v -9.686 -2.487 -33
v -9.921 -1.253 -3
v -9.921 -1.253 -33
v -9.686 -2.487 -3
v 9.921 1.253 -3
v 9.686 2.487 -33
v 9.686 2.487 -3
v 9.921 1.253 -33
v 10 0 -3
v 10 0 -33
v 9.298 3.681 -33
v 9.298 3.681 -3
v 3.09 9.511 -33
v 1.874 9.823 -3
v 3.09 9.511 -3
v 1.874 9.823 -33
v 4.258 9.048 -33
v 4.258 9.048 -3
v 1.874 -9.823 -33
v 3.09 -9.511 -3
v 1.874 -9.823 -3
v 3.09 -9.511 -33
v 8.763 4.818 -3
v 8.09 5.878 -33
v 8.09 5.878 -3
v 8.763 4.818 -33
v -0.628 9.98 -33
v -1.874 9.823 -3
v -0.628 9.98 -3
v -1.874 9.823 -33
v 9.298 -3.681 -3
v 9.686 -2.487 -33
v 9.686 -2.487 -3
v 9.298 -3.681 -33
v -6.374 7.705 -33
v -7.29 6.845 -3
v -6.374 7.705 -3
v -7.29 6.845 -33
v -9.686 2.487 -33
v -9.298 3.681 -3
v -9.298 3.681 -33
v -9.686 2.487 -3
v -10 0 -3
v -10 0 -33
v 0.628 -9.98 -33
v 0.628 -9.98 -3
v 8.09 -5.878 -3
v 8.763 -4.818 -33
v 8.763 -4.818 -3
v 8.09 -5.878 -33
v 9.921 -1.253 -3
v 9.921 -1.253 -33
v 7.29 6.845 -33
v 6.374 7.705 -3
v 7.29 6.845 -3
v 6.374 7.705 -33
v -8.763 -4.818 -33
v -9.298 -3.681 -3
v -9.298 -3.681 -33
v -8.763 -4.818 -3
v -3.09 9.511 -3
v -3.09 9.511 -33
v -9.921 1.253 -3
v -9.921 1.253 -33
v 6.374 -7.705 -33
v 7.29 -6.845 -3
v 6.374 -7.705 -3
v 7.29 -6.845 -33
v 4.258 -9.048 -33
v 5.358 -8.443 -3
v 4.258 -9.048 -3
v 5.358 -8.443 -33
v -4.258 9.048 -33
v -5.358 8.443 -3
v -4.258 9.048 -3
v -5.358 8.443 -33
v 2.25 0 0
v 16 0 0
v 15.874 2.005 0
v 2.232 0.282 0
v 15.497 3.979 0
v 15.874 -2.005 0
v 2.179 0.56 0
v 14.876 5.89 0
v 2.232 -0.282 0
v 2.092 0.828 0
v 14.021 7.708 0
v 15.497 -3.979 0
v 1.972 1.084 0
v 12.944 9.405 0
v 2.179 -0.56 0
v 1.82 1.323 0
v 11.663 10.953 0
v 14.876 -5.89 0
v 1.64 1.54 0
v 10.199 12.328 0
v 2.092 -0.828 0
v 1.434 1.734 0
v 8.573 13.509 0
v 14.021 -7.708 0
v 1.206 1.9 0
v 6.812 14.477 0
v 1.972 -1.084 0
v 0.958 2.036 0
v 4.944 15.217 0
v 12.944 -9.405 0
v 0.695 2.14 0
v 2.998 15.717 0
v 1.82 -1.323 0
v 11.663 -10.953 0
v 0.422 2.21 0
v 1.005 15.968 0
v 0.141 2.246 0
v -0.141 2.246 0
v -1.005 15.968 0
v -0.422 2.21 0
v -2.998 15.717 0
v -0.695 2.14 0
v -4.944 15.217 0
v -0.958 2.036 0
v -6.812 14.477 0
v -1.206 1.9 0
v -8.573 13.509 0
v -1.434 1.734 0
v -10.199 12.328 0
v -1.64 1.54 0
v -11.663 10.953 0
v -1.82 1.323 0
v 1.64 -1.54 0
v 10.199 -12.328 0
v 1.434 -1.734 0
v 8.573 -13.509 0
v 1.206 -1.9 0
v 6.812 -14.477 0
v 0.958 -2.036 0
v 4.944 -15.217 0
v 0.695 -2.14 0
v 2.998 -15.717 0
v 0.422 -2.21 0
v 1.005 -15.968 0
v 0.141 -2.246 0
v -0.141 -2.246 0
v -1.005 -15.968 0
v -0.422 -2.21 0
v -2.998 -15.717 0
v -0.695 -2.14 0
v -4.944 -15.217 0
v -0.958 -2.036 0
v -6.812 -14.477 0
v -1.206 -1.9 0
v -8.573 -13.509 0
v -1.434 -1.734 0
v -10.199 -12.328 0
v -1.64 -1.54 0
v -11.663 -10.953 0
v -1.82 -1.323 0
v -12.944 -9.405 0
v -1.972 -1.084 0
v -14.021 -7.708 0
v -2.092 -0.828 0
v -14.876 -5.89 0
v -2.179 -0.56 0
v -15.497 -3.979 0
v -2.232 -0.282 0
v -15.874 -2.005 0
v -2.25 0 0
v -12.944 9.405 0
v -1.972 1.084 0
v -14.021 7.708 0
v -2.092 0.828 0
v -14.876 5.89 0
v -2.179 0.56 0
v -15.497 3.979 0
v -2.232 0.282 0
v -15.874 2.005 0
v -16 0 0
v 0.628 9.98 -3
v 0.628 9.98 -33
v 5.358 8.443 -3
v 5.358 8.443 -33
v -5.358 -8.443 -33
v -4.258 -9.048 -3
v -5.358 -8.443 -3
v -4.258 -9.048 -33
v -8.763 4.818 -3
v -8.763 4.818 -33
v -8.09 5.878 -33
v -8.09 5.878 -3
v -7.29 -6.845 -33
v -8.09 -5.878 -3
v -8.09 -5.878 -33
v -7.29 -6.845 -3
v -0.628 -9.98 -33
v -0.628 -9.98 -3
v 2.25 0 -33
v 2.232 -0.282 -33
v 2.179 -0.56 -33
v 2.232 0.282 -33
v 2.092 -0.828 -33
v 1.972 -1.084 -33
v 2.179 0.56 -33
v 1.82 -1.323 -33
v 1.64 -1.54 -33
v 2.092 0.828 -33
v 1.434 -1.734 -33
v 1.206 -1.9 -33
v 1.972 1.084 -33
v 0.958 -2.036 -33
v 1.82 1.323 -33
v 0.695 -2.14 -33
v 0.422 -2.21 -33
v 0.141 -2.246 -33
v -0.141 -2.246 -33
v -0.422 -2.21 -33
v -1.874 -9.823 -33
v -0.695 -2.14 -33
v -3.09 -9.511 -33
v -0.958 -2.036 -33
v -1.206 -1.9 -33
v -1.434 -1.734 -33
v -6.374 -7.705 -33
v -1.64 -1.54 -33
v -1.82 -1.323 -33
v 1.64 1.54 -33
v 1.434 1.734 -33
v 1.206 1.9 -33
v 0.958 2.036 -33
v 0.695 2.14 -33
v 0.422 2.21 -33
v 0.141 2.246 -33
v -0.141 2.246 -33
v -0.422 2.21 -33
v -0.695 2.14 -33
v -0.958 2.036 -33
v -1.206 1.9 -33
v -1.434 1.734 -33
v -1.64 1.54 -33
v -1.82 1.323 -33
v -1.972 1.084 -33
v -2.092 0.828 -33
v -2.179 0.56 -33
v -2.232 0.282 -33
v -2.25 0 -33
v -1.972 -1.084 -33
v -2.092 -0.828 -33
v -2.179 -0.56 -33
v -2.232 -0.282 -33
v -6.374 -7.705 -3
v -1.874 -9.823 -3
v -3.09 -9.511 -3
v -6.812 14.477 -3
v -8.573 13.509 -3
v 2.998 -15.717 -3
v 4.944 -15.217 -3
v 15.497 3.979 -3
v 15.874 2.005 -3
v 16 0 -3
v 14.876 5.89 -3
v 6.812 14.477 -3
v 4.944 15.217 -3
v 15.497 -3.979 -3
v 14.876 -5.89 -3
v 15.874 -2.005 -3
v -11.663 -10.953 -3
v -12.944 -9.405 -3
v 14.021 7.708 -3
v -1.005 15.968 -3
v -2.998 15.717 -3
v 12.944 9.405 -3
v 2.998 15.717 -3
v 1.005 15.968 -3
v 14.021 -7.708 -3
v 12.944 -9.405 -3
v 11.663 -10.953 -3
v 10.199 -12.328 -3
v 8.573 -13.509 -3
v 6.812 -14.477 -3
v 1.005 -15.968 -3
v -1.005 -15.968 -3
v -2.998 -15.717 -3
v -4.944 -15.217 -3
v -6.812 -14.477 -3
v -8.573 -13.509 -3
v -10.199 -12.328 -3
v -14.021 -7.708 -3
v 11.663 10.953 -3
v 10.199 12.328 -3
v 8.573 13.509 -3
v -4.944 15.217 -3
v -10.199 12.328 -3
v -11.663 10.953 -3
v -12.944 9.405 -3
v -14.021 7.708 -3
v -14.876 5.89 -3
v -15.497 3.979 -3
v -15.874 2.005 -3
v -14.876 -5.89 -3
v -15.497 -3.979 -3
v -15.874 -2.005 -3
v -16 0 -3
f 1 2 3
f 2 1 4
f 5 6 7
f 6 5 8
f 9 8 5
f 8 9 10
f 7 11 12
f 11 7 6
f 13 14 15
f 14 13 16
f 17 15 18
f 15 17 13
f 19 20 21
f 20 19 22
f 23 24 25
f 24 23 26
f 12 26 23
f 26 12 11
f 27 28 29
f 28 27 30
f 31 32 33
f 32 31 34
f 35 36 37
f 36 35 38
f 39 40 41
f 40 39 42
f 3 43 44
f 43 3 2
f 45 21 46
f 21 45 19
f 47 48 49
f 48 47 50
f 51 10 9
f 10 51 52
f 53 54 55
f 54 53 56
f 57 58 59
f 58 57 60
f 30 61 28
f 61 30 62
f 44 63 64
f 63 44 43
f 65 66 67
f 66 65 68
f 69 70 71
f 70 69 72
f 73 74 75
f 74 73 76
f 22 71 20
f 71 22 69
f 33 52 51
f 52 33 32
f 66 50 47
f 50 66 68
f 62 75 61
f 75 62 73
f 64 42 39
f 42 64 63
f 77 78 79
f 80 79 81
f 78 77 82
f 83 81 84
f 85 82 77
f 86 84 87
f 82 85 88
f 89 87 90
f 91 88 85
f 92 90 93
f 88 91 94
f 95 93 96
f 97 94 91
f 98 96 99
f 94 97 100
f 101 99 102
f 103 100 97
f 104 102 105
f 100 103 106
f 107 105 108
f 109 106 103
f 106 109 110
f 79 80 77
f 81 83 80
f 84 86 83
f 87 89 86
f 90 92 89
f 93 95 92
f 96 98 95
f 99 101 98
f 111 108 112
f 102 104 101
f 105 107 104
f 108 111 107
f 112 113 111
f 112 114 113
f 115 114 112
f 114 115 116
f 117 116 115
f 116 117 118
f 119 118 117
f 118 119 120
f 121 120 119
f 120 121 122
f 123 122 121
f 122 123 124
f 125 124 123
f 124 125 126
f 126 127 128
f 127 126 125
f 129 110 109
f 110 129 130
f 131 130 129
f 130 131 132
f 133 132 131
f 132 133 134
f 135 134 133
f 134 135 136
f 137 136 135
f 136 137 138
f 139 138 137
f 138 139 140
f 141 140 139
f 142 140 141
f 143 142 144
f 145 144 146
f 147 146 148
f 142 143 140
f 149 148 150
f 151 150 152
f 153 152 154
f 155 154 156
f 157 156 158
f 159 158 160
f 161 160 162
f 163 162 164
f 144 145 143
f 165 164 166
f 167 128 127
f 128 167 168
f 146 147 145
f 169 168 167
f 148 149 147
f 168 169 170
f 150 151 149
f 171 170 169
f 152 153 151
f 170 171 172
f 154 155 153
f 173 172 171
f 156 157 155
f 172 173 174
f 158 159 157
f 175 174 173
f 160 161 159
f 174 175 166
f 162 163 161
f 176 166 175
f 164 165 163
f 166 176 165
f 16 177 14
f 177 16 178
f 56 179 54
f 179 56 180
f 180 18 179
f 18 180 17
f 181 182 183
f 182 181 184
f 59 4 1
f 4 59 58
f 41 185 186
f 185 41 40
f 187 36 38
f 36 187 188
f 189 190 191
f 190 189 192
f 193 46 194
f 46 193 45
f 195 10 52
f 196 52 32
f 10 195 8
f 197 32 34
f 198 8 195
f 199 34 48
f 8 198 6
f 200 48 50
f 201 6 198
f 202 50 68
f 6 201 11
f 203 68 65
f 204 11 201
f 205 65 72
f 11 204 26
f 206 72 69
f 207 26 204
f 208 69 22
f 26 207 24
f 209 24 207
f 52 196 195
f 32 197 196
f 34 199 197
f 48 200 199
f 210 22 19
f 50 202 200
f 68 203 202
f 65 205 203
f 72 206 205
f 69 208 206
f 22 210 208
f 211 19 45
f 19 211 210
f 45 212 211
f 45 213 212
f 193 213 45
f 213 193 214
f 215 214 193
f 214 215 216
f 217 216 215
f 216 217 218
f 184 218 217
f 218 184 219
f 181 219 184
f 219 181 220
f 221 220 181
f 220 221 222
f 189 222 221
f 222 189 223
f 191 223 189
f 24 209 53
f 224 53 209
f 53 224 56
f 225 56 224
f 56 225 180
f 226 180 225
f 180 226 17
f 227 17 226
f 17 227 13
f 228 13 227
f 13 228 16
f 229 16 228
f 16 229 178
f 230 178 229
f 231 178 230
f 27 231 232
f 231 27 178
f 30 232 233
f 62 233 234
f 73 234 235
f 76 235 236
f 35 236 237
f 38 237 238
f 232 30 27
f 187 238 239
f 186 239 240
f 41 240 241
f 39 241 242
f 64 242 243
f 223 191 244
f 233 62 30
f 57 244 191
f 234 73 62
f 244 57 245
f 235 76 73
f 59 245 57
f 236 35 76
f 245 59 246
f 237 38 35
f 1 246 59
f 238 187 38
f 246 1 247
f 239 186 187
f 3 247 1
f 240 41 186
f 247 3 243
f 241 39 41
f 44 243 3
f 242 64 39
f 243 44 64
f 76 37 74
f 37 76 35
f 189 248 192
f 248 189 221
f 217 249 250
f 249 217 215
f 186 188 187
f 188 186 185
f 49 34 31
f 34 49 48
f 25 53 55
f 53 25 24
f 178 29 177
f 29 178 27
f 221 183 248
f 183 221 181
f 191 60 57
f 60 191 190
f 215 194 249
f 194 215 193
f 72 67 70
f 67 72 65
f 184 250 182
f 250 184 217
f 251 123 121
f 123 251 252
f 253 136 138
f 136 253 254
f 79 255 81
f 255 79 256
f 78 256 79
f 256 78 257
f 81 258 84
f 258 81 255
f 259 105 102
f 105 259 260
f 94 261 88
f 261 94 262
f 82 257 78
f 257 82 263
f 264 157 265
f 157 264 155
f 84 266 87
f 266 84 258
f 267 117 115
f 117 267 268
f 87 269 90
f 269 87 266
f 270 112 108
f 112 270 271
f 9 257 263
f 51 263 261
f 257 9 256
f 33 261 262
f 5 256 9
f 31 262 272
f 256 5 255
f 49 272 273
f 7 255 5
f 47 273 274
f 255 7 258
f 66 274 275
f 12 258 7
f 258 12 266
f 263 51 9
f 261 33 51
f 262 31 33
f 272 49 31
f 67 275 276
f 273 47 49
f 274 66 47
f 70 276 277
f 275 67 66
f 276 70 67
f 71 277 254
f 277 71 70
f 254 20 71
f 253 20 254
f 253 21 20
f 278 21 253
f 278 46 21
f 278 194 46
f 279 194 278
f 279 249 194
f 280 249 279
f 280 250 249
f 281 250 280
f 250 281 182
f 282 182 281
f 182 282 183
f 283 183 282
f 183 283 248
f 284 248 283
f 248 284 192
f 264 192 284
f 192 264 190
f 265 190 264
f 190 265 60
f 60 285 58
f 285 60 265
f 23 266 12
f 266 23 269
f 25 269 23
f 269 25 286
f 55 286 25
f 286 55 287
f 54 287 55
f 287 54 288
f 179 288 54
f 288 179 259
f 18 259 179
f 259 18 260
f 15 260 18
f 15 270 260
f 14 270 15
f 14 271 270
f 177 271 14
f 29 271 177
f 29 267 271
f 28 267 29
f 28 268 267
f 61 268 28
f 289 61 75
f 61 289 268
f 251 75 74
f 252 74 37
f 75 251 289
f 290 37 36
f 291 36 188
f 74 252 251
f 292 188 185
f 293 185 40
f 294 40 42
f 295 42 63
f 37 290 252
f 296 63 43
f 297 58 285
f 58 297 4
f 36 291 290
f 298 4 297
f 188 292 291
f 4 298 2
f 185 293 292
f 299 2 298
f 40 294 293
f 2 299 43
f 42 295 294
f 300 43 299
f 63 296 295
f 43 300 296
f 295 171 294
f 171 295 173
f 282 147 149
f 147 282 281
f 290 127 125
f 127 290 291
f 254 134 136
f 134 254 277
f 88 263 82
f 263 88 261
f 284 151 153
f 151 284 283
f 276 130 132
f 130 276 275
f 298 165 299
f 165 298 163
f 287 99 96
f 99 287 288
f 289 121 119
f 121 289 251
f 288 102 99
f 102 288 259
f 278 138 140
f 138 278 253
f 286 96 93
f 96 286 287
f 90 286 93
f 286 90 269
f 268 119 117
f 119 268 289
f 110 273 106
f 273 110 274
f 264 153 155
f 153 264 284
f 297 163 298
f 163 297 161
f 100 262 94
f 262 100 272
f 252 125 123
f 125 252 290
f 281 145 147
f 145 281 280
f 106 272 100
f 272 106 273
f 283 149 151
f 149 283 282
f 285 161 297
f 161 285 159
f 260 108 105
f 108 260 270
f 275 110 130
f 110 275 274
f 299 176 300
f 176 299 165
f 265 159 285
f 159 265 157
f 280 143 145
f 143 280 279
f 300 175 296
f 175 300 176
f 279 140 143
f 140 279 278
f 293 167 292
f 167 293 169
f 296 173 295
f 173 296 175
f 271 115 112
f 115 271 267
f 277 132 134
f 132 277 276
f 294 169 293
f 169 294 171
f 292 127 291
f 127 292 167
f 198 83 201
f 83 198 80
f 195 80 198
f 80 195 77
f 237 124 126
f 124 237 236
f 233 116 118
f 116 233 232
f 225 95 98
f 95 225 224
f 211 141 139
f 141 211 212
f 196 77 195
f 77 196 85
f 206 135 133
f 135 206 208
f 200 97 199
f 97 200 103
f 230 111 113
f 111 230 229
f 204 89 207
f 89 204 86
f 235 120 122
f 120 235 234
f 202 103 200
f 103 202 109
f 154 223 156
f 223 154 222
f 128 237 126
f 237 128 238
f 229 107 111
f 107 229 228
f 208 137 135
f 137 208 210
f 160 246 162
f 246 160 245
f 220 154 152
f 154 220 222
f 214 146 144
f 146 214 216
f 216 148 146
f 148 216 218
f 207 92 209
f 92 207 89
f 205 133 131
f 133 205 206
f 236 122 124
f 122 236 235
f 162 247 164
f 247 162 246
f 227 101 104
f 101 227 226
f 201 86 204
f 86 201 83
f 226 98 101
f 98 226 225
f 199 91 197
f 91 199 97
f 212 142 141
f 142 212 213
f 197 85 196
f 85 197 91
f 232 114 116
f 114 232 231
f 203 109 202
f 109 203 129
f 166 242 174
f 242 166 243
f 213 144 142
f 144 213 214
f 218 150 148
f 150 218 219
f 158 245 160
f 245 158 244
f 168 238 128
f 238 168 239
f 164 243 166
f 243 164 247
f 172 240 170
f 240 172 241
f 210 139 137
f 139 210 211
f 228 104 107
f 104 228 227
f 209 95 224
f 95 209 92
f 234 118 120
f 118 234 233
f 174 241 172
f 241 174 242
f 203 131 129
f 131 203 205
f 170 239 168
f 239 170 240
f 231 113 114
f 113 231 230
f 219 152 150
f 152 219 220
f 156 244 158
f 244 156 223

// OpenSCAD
$fn = 50;


difference() {
	union() {
		translate(v = [0, 0, -33.0000000000]) {
			cylinder(h = 33, r = 10.0000000000);
		}
		translate(v = [0, 0, -3.0000000000]) {
			cylinder(h = 3, r = 16.0000000000);
		}
	}
	union() {
		#translate(v = [0, 0, -33]) {
			cylinder(h = 33, r = 2.2500000000);
		}
	}
}
